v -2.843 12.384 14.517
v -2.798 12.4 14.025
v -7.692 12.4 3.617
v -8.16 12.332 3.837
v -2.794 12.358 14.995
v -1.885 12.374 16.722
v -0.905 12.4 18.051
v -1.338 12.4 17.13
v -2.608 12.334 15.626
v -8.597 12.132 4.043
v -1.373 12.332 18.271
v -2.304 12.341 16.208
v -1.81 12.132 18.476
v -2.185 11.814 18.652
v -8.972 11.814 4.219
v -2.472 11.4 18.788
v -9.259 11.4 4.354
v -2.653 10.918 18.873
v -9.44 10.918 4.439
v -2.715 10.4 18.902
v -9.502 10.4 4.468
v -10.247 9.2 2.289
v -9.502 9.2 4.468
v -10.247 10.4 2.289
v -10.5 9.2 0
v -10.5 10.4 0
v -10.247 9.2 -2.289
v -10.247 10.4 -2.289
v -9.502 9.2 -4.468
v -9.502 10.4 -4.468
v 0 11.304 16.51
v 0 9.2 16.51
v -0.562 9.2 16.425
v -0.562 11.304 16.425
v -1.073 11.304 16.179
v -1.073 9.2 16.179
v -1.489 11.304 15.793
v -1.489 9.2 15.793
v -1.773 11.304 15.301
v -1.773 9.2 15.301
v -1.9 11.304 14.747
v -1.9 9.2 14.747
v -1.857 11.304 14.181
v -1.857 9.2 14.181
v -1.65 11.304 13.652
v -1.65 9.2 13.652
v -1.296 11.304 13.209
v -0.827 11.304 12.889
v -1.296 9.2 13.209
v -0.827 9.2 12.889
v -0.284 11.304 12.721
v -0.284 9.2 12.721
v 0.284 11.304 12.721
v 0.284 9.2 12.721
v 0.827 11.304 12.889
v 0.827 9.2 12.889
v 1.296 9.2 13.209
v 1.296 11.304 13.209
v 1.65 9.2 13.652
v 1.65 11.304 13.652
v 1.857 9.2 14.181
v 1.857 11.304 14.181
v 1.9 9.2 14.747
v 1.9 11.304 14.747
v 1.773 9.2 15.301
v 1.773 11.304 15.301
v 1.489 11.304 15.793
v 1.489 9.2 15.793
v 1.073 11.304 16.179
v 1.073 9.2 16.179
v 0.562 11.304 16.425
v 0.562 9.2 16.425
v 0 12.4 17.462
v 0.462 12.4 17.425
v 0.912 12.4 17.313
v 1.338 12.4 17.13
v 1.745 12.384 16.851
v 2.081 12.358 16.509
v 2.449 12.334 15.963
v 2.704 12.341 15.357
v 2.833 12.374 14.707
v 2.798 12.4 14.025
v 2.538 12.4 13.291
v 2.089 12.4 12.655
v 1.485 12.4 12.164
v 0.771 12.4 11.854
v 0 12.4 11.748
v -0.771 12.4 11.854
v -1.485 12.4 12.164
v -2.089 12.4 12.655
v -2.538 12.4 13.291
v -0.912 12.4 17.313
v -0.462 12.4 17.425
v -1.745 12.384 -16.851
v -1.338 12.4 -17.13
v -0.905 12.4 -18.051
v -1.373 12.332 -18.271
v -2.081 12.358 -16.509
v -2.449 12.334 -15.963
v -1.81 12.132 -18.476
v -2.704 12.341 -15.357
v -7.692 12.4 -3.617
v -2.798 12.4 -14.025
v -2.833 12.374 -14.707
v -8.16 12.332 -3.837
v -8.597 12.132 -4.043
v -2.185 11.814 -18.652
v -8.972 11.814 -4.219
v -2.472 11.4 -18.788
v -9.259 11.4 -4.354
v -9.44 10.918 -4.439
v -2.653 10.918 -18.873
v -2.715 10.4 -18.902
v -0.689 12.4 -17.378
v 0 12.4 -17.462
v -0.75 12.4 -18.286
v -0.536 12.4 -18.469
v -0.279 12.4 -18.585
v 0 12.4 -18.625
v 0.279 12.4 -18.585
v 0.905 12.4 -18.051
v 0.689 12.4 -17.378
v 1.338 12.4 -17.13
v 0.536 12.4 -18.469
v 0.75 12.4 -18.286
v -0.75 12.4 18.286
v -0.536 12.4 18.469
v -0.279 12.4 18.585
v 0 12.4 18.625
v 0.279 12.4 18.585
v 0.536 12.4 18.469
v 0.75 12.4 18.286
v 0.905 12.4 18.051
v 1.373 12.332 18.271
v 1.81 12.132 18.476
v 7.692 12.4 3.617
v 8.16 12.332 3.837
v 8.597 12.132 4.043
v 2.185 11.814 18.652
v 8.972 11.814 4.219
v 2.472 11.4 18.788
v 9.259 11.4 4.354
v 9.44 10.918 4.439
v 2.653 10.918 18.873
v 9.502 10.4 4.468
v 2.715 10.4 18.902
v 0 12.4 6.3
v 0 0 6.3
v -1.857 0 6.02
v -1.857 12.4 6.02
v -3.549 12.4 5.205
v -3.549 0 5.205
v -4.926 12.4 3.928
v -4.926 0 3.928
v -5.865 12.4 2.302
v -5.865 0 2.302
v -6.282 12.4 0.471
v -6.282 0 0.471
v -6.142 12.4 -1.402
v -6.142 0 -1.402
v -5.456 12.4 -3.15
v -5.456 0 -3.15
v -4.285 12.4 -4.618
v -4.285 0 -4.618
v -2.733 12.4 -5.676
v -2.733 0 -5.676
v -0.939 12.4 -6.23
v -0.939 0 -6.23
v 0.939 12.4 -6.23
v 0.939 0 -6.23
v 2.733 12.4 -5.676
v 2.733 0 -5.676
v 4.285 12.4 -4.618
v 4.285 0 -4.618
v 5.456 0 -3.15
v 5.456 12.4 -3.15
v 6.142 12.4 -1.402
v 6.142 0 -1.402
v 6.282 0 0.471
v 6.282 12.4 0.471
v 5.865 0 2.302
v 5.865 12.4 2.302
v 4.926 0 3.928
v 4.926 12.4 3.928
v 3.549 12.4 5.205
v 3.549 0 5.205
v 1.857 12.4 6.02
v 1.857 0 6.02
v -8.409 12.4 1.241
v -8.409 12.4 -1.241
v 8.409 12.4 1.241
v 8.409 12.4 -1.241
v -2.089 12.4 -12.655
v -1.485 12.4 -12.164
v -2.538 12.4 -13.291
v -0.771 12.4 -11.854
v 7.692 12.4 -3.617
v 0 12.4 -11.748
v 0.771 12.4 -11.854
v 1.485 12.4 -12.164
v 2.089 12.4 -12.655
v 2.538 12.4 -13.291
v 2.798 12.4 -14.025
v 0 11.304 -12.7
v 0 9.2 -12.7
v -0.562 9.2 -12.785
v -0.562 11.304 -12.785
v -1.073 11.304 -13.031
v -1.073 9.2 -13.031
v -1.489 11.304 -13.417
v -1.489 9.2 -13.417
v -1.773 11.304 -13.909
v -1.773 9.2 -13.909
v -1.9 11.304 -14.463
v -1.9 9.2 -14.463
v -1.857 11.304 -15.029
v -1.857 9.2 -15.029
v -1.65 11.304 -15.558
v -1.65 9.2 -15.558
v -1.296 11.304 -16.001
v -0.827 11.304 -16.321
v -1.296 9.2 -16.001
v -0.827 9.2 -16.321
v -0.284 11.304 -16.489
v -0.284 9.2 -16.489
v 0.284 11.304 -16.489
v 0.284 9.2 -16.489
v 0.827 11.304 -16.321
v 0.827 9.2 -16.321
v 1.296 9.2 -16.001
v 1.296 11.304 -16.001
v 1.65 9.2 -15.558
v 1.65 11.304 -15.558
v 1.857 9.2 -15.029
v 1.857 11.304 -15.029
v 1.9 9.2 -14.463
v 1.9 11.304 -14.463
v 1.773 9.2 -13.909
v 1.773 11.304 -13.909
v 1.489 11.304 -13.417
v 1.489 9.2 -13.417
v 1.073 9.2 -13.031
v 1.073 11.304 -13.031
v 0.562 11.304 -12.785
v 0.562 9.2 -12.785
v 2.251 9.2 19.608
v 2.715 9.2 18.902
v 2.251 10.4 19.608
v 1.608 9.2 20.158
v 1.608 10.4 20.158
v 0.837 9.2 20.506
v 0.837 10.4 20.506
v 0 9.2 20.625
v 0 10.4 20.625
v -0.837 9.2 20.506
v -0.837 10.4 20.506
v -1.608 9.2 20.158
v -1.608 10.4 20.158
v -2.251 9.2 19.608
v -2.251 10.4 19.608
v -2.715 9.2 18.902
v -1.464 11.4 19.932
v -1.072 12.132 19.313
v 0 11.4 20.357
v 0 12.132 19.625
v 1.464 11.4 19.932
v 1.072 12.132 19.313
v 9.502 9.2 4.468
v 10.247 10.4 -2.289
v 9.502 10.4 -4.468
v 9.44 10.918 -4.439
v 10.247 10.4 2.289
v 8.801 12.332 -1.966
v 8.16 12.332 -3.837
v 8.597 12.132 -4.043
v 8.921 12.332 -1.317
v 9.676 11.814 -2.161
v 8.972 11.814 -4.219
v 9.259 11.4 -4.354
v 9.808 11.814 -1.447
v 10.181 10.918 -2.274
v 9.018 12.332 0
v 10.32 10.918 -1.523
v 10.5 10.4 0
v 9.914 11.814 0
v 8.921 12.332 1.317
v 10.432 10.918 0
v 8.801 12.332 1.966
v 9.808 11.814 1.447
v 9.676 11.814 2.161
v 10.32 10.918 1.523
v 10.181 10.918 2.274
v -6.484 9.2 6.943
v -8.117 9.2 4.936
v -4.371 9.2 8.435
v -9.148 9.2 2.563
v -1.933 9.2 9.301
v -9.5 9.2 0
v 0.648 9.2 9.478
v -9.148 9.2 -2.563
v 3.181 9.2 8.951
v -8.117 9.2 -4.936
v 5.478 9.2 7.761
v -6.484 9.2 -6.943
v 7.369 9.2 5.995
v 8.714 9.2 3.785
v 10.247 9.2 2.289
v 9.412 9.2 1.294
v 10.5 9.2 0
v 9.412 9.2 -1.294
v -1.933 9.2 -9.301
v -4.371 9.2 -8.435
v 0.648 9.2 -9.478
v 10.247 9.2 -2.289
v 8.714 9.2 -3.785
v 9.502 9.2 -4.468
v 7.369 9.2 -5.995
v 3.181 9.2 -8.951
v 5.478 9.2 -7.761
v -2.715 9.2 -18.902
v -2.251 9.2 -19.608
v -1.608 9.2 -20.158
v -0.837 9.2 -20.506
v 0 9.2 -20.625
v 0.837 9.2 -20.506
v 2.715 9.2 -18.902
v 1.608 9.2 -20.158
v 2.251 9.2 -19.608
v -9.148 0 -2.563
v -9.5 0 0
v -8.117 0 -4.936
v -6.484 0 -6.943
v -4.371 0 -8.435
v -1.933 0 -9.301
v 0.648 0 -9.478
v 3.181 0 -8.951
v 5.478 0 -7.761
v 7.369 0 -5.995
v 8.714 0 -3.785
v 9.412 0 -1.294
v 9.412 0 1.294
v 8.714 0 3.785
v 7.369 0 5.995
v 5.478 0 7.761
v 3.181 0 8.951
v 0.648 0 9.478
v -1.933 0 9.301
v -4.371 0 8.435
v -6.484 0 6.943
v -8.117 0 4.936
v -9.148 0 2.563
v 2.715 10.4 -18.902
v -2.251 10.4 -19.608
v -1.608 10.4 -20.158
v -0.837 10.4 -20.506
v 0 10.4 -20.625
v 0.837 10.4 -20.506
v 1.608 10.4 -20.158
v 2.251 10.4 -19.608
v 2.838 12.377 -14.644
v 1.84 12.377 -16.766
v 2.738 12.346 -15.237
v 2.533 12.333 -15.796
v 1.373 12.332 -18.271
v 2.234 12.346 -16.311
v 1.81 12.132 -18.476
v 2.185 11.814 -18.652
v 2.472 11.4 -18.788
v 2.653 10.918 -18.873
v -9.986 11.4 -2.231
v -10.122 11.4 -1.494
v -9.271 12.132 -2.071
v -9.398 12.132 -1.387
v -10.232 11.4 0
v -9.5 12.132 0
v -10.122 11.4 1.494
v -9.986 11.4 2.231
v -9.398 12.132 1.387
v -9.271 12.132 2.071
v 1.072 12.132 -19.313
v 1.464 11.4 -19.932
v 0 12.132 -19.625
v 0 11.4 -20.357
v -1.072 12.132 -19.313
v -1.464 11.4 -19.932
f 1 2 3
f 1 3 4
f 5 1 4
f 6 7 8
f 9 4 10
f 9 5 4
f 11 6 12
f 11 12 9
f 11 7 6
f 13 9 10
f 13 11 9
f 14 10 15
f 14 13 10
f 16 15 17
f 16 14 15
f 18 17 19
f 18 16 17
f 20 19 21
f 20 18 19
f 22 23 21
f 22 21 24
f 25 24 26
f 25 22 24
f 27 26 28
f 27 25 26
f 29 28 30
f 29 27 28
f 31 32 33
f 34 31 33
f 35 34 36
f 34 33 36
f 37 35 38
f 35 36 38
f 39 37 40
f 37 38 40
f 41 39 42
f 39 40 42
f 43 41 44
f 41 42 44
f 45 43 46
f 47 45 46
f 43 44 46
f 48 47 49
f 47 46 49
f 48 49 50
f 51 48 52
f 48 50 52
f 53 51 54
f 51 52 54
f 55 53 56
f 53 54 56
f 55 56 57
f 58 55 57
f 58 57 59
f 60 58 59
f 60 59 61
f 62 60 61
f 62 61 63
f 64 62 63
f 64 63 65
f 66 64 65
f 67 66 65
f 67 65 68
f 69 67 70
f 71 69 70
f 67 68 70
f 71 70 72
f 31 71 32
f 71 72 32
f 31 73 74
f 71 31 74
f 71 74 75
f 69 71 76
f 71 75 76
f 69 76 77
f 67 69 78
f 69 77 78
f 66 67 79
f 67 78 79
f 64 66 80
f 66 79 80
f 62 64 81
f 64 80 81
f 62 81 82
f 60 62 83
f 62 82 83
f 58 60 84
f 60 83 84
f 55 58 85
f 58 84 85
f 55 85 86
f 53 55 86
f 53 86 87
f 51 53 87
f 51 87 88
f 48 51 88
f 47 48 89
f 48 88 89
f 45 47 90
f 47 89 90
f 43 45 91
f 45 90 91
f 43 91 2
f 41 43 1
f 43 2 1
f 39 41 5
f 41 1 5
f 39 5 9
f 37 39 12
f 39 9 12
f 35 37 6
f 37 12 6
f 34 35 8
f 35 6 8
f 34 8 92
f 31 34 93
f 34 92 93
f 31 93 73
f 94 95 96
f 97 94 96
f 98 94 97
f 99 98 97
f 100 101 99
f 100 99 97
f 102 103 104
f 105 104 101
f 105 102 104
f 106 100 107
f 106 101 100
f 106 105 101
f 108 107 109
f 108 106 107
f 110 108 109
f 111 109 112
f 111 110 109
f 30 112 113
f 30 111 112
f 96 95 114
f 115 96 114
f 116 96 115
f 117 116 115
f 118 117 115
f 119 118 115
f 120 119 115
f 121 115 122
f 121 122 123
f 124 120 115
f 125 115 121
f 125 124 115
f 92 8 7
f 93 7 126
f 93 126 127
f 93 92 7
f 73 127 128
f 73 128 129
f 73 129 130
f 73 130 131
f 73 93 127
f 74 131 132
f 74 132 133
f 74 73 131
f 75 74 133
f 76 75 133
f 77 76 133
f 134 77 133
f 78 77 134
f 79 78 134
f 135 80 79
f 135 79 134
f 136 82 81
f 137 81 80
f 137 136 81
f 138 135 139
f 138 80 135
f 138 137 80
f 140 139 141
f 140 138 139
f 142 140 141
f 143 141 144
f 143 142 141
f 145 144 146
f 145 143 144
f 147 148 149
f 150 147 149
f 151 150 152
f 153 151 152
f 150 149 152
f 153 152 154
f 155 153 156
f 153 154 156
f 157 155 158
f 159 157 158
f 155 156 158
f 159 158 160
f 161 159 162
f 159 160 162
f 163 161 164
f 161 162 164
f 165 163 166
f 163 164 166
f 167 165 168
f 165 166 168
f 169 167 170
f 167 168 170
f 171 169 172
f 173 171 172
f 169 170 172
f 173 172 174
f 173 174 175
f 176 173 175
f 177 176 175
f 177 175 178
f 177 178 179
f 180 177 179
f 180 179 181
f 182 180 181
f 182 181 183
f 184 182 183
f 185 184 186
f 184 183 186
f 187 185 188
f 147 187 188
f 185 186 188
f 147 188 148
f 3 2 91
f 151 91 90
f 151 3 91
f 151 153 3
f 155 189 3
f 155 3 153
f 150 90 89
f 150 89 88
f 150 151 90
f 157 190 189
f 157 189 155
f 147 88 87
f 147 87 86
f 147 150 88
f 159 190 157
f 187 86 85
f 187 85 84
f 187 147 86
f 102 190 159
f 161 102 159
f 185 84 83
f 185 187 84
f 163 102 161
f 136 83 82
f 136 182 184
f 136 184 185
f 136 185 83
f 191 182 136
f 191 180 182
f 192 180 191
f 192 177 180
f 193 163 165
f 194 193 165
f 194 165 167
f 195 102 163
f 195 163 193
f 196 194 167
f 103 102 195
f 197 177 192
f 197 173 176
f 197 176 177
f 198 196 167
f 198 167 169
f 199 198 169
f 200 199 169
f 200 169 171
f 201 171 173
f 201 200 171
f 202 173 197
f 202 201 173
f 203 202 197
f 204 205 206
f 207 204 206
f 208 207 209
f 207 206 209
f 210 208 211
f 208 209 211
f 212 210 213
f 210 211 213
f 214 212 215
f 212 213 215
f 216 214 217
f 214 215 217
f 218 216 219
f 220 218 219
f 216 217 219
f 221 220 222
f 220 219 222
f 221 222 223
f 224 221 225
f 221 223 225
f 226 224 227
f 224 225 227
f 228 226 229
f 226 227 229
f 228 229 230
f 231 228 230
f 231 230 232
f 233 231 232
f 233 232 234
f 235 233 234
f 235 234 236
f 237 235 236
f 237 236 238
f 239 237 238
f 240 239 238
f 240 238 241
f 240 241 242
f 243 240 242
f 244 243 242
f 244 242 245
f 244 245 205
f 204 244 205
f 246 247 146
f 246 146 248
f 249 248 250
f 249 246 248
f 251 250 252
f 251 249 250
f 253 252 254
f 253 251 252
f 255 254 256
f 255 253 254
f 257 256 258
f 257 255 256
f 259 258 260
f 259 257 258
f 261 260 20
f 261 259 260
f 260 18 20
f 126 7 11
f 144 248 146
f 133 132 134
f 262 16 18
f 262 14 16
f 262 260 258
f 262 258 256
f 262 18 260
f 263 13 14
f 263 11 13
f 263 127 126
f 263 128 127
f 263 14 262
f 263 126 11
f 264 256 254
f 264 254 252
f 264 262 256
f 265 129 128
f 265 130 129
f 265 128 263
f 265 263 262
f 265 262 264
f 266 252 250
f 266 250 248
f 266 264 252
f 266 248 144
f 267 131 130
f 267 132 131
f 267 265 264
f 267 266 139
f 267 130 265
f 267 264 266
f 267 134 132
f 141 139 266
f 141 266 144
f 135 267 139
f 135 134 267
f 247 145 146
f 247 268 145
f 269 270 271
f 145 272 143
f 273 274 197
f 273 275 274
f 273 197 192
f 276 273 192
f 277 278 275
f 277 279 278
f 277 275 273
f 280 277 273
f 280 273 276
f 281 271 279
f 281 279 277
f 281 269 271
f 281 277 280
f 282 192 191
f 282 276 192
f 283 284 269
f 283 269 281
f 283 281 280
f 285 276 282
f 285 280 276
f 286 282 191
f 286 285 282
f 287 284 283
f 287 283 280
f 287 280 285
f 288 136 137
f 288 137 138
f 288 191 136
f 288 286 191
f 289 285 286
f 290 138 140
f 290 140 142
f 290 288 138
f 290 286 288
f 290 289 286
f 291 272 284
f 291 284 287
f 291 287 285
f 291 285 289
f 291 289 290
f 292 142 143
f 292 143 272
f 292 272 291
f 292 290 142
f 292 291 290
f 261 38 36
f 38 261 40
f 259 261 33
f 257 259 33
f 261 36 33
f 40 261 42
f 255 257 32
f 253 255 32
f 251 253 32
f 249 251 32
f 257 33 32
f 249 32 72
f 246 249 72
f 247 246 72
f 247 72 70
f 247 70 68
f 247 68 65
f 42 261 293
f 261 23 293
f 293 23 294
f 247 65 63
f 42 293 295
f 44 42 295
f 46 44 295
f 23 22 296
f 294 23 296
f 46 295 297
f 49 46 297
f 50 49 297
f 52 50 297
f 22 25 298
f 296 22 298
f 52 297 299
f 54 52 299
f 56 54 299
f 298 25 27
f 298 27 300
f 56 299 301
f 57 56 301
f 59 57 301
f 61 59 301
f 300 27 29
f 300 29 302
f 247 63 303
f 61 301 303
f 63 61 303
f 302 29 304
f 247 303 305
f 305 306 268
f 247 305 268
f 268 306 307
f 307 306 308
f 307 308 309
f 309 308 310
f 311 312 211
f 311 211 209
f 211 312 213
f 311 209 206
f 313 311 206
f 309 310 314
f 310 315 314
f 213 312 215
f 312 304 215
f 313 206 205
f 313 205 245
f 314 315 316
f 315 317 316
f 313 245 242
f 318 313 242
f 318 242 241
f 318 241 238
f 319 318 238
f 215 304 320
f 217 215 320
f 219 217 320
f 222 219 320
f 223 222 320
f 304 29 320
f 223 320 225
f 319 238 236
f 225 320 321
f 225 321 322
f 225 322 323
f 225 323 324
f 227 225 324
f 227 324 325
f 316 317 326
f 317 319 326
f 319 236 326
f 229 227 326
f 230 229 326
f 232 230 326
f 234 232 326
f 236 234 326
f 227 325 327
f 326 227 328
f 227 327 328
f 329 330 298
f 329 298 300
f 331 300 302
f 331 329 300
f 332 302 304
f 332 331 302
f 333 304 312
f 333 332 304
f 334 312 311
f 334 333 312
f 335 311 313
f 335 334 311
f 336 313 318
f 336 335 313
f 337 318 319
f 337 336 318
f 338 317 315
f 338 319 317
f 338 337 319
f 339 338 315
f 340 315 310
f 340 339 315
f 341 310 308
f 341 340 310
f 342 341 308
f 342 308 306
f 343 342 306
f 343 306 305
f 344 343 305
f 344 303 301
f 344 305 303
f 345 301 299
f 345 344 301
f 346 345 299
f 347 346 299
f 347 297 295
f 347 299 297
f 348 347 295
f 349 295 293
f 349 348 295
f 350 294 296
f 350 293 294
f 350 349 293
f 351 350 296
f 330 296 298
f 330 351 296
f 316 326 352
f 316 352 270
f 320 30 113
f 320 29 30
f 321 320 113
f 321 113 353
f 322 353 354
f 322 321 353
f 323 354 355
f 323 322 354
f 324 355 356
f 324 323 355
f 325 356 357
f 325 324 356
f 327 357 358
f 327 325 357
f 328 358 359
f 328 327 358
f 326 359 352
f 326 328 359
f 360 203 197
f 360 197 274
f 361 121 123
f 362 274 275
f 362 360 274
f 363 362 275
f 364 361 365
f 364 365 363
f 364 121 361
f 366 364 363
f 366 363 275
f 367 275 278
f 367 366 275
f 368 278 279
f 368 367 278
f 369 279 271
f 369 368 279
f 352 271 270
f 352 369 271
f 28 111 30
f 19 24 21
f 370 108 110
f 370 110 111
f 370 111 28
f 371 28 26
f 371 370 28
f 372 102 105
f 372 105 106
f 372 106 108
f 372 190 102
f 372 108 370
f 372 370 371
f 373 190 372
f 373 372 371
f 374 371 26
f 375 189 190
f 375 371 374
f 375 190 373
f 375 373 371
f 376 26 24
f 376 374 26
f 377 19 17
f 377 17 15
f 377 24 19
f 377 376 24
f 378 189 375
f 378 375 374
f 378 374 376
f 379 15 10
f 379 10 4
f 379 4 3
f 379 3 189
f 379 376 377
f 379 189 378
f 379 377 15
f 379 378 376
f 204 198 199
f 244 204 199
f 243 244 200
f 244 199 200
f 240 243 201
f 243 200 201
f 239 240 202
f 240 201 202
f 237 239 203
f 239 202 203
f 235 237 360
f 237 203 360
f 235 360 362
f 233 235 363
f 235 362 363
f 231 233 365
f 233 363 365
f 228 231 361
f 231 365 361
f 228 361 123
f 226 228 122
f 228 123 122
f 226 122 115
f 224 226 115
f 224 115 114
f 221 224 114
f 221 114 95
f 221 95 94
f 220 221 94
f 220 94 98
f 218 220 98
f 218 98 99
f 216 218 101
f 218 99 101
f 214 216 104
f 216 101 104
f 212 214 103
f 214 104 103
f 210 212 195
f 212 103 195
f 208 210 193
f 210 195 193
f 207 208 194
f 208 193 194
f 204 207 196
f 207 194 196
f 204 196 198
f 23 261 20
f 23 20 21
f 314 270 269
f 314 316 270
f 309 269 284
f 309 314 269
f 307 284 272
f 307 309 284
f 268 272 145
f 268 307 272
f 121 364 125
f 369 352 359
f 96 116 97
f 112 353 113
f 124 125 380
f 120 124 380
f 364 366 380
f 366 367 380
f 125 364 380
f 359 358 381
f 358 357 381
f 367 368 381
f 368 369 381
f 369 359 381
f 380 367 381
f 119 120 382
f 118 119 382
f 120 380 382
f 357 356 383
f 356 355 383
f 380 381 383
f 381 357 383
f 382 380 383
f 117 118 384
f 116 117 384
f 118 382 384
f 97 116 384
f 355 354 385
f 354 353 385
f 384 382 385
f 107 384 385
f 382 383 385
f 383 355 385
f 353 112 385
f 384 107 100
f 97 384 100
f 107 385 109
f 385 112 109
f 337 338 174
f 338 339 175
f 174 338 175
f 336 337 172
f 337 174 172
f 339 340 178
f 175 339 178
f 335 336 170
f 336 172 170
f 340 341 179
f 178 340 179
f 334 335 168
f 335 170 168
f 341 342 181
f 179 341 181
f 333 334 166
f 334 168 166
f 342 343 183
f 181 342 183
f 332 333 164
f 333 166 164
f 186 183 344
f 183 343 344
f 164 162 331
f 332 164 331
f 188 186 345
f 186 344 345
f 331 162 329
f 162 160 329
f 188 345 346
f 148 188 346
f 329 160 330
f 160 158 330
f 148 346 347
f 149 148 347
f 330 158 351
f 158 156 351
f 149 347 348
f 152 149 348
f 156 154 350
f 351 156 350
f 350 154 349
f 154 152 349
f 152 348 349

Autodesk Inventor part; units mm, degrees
ref_plane "YZ Plane" through (0, 0, 0) normal (1, 0, 0) x (0, 1, 0)
ref_plane "XZ Plane" through (0, 0, 0) normal (0, 1, 0) x (-1, 0, 0)
ref_plane "XY Plane" through (0, 0, 0) normal (0, 0, 1) x (1, 0, 0)
sketch "Sketch1" plane through (0, 0, 0) normal (0, 1, 0) x (-1, 0, 0)
  circle A0 centre (0, 0) radius 9.5
  dimension "Cutout_Diameter" = 19
extrude "Extrusion1" add sketch "Sketch1" along normal blind 9.2
sketch "Sketch2" plane through (0, 9.2, 0) normal (0, 1, 0) x (1, 0, 0)
  line L0 (0, 0) -> (0, 17.625) construction
  line L1 (0, 0) -> (0, -17.625) construction
  arc A0 (-2.7148, -18.9016) -> (2.7148, -18.9016) centre (0, -17.625) ccw
  arc A1 (2.7148, 18.9016) -> (-2.7148, 18.9016) centre (0, 17.625) ccw
  line L2 (-2.7148, -18.9016) -> (-9.5019, -4.4681)
  line L3 (-9.5019, 4.4681) -> (-2.7148, 18.9016)
  line L4 (2.7148, 18.9016) -> (9.5019, 4.4681)
  line L5 (9.5019, -4.4681) -> (2.7148, -18.9016)
  arc A2 (9.5019, -4.4681) -> (9.5019, 4.4681) centre (0, 0) ccw
  arc A3 (-9.5019, 4.4681) -> (-9.5019, -4.4681) centre (0, 0) ccw
  dimension "Mount_Tip_Radius" = 6
  dimension "Mount_Center_Radius" = 10.5
  dimension "Mount_Tip_Length" = 41.25
extrude "Extrusion2" add sketch "Sketch2" along normal blind 3.2
sketch "Sketch3" plane through (0, 12.4, 0) normal (0, 1, 0) x (1, 0, 0)
  line L0 (0, -14.605) -> (0, 14.605) construction
  point P0 (0, 0)
  point P1 (0, 0)
  dimension "Mount_Hole_Spacing" = 29.21
hole "Hole1" at (0, 12.4, 14.605) at (0, 12.4, -14.605) direction (0, -1, 0) diameter 3.81 end through all countersink diameter 5.715 countersink angle 82
sketch "Sketch4" plane through (0, 12.4, 0) normal (0, 1, 0) x (1, 0, 0)
  point P0 (0, 0)
  point P1 (0, 0)
hole "Hole2" at (0, 12.4, 0) direction (0, -1, 0) diameter 12.6 end through all
fillet "Fillet1" radius 2 8 edges at (10.5, 12.4, 0) (6.1084, 12.4, -11.6848) (0, 12.4, -20.625) (-6.1084, 12.4, -11.6848) (-10.5, 12.4, 0) (-6.1084, 12.4, 11.6848) (0, 12.4, 20.625) (6.1084, 12.4, 11.6848)
properties part number "Deck_Bushing_Outer" material "Nylon 6/6"
